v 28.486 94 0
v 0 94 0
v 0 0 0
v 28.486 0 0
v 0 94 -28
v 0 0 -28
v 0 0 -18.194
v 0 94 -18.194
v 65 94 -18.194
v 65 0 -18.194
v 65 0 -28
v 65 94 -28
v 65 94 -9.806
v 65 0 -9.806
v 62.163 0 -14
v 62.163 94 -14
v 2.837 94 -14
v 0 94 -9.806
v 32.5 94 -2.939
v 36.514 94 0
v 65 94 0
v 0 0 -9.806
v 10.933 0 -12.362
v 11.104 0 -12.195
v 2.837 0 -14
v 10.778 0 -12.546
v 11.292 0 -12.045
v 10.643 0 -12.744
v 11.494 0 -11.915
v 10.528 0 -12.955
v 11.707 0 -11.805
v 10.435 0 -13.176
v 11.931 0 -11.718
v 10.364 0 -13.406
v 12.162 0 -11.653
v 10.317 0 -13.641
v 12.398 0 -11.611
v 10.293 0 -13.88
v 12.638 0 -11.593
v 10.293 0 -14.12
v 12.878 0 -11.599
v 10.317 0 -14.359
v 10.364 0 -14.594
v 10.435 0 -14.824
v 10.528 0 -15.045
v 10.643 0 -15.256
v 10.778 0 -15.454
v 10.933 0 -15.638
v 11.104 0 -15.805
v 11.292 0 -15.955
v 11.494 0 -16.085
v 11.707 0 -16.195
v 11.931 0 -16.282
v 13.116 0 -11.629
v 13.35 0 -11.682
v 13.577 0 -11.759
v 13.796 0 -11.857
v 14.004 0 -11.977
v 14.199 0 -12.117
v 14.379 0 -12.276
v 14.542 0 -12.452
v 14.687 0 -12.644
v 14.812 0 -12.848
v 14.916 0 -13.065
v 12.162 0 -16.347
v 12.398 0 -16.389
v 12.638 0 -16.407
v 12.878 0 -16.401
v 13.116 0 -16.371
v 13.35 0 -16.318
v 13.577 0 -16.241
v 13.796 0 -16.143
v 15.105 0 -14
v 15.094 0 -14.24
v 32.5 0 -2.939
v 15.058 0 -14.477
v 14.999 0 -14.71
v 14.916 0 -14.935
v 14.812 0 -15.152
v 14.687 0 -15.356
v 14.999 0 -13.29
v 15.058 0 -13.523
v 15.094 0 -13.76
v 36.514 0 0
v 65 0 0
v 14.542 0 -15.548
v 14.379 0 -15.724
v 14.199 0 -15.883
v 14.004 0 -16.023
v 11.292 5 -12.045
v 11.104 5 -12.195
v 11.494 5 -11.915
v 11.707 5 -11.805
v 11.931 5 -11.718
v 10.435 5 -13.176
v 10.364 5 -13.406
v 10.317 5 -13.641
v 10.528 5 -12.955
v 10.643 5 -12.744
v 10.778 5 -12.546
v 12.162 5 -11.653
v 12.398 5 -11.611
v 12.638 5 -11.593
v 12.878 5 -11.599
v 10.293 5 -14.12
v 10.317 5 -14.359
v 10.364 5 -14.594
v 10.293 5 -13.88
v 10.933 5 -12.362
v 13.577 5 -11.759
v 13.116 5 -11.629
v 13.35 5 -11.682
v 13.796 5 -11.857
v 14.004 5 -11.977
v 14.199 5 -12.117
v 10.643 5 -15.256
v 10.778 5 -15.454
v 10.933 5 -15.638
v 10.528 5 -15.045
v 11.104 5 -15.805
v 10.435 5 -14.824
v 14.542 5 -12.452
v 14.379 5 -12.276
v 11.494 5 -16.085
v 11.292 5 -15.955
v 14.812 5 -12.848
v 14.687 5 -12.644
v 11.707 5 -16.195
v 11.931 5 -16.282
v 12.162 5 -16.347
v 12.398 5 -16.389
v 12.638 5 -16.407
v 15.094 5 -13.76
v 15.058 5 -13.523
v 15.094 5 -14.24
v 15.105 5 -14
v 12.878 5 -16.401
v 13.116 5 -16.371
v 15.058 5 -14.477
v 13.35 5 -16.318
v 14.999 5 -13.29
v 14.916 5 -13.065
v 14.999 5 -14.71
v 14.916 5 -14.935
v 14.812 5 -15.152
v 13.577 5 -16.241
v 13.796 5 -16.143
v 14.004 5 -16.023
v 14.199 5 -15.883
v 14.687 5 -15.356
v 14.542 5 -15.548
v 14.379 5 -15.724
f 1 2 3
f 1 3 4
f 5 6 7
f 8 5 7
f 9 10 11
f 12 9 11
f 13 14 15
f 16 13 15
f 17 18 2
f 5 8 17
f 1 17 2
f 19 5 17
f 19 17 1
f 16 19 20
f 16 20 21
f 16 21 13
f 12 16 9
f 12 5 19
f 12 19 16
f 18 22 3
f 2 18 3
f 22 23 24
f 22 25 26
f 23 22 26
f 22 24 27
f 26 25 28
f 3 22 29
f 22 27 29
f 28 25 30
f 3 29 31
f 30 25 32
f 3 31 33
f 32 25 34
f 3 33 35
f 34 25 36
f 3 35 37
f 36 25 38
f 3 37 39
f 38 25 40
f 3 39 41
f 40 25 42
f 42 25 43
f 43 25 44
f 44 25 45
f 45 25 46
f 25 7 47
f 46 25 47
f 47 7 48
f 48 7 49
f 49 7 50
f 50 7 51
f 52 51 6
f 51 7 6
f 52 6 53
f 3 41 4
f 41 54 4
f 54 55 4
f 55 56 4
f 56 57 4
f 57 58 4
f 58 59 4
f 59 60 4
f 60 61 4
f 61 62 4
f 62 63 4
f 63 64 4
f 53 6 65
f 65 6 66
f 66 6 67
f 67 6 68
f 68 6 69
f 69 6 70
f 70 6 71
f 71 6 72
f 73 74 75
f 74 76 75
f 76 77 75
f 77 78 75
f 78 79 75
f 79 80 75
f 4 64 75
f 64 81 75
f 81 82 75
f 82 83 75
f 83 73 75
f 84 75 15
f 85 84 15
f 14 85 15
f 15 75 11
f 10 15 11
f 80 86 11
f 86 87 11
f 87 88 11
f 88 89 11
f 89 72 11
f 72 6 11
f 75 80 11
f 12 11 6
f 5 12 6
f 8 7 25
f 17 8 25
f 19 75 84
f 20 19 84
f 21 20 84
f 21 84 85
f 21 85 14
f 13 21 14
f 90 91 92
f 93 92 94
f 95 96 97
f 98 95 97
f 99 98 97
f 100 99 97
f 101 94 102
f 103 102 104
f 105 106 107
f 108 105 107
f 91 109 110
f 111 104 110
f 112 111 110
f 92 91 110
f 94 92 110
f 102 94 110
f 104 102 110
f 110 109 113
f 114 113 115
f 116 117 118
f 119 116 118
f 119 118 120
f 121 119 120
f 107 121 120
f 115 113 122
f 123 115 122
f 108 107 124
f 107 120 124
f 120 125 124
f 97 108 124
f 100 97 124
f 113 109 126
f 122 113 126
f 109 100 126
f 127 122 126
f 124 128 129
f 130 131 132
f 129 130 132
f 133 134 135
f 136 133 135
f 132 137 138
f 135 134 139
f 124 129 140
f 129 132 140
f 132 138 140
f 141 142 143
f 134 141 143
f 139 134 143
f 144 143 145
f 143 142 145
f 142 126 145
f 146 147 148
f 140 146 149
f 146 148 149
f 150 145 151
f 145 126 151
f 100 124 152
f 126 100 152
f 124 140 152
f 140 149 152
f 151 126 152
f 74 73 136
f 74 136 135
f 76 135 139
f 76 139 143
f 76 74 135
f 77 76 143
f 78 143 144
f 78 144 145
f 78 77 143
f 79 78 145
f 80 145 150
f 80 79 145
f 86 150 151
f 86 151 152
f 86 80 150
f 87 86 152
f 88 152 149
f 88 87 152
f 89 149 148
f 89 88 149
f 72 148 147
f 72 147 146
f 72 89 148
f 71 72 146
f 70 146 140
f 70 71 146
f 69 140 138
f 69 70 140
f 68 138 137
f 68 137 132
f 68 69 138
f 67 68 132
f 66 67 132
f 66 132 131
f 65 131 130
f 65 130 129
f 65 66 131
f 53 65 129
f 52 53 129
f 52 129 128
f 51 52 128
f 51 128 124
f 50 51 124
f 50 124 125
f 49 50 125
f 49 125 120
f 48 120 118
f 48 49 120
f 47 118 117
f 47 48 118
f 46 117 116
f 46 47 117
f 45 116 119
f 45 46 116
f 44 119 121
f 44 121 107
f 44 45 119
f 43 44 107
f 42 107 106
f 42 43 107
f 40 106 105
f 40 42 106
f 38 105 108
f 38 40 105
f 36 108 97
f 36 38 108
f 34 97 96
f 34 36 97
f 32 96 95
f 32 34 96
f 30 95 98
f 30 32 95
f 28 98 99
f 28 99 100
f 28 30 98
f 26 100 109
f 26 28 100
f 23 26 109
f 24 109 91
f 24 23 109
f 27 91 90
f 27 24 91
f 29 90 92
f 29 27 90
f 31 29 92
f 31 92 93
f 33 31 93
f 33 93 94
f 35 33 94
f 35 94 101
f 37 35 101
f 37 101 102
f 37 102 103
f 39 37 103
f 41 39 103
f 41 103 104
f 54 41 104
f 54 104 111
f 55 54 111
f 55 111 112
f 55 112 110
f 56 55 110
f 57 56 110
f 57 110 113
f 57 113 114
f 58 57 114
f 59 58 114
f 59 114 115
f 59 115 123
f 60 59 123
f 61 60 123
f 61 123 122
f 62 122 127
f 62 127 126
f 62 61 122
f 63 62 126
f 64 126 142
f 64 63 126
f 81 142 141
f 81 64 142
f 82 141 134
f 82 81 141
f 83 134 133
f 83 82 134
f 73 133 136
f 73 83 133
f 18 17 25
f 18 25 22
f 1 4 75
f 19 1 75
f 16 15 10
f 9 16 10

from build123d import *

# Parameters (mm, degrees)
BOSS_EXTRUDE1_DEPTH = 94
SKETCH1_3_R         = 2.40784246
CUT_EXTRUDE1_DEPTH  = 5


with BuildPart() as part:
    # Sketch1 → Boss-Extrude1 (new body)
    with BuildSketch(Plane(origin=(0, 0, 0), x_dir=(1, 0, 0), z_dir=(0, 1, 0))):
        Polygon((0, 9.805763686), (0, 0), (28.48646363, 0), (32.5, 2.93900405), (36.51353637, 0), (65, 0), (65, 9.805763686), (62.163382508, 14), (65, 18.194236314), (65, 28), (0, 28), (0, 18.194236314), (2.836617492, 14), align=None)
    extrude(amount=BOSS_EXTRUDE1_DEPTH)

    # Sketch1<3> → Cut-Extrude1 (cut)
    with BuildSketch(Plane(origin=(0, 0, 0), x_dir=(1, 0, 0), z_dir=(0, 1, 0))):
        with Locations((12.697649227, 14)):
            Circle(SKETCH1_3_R)
    extrude(amount=CUT_EXTRUDE1_DEPTH, mode=Mode.SUBTRACT)


solid = part.part
